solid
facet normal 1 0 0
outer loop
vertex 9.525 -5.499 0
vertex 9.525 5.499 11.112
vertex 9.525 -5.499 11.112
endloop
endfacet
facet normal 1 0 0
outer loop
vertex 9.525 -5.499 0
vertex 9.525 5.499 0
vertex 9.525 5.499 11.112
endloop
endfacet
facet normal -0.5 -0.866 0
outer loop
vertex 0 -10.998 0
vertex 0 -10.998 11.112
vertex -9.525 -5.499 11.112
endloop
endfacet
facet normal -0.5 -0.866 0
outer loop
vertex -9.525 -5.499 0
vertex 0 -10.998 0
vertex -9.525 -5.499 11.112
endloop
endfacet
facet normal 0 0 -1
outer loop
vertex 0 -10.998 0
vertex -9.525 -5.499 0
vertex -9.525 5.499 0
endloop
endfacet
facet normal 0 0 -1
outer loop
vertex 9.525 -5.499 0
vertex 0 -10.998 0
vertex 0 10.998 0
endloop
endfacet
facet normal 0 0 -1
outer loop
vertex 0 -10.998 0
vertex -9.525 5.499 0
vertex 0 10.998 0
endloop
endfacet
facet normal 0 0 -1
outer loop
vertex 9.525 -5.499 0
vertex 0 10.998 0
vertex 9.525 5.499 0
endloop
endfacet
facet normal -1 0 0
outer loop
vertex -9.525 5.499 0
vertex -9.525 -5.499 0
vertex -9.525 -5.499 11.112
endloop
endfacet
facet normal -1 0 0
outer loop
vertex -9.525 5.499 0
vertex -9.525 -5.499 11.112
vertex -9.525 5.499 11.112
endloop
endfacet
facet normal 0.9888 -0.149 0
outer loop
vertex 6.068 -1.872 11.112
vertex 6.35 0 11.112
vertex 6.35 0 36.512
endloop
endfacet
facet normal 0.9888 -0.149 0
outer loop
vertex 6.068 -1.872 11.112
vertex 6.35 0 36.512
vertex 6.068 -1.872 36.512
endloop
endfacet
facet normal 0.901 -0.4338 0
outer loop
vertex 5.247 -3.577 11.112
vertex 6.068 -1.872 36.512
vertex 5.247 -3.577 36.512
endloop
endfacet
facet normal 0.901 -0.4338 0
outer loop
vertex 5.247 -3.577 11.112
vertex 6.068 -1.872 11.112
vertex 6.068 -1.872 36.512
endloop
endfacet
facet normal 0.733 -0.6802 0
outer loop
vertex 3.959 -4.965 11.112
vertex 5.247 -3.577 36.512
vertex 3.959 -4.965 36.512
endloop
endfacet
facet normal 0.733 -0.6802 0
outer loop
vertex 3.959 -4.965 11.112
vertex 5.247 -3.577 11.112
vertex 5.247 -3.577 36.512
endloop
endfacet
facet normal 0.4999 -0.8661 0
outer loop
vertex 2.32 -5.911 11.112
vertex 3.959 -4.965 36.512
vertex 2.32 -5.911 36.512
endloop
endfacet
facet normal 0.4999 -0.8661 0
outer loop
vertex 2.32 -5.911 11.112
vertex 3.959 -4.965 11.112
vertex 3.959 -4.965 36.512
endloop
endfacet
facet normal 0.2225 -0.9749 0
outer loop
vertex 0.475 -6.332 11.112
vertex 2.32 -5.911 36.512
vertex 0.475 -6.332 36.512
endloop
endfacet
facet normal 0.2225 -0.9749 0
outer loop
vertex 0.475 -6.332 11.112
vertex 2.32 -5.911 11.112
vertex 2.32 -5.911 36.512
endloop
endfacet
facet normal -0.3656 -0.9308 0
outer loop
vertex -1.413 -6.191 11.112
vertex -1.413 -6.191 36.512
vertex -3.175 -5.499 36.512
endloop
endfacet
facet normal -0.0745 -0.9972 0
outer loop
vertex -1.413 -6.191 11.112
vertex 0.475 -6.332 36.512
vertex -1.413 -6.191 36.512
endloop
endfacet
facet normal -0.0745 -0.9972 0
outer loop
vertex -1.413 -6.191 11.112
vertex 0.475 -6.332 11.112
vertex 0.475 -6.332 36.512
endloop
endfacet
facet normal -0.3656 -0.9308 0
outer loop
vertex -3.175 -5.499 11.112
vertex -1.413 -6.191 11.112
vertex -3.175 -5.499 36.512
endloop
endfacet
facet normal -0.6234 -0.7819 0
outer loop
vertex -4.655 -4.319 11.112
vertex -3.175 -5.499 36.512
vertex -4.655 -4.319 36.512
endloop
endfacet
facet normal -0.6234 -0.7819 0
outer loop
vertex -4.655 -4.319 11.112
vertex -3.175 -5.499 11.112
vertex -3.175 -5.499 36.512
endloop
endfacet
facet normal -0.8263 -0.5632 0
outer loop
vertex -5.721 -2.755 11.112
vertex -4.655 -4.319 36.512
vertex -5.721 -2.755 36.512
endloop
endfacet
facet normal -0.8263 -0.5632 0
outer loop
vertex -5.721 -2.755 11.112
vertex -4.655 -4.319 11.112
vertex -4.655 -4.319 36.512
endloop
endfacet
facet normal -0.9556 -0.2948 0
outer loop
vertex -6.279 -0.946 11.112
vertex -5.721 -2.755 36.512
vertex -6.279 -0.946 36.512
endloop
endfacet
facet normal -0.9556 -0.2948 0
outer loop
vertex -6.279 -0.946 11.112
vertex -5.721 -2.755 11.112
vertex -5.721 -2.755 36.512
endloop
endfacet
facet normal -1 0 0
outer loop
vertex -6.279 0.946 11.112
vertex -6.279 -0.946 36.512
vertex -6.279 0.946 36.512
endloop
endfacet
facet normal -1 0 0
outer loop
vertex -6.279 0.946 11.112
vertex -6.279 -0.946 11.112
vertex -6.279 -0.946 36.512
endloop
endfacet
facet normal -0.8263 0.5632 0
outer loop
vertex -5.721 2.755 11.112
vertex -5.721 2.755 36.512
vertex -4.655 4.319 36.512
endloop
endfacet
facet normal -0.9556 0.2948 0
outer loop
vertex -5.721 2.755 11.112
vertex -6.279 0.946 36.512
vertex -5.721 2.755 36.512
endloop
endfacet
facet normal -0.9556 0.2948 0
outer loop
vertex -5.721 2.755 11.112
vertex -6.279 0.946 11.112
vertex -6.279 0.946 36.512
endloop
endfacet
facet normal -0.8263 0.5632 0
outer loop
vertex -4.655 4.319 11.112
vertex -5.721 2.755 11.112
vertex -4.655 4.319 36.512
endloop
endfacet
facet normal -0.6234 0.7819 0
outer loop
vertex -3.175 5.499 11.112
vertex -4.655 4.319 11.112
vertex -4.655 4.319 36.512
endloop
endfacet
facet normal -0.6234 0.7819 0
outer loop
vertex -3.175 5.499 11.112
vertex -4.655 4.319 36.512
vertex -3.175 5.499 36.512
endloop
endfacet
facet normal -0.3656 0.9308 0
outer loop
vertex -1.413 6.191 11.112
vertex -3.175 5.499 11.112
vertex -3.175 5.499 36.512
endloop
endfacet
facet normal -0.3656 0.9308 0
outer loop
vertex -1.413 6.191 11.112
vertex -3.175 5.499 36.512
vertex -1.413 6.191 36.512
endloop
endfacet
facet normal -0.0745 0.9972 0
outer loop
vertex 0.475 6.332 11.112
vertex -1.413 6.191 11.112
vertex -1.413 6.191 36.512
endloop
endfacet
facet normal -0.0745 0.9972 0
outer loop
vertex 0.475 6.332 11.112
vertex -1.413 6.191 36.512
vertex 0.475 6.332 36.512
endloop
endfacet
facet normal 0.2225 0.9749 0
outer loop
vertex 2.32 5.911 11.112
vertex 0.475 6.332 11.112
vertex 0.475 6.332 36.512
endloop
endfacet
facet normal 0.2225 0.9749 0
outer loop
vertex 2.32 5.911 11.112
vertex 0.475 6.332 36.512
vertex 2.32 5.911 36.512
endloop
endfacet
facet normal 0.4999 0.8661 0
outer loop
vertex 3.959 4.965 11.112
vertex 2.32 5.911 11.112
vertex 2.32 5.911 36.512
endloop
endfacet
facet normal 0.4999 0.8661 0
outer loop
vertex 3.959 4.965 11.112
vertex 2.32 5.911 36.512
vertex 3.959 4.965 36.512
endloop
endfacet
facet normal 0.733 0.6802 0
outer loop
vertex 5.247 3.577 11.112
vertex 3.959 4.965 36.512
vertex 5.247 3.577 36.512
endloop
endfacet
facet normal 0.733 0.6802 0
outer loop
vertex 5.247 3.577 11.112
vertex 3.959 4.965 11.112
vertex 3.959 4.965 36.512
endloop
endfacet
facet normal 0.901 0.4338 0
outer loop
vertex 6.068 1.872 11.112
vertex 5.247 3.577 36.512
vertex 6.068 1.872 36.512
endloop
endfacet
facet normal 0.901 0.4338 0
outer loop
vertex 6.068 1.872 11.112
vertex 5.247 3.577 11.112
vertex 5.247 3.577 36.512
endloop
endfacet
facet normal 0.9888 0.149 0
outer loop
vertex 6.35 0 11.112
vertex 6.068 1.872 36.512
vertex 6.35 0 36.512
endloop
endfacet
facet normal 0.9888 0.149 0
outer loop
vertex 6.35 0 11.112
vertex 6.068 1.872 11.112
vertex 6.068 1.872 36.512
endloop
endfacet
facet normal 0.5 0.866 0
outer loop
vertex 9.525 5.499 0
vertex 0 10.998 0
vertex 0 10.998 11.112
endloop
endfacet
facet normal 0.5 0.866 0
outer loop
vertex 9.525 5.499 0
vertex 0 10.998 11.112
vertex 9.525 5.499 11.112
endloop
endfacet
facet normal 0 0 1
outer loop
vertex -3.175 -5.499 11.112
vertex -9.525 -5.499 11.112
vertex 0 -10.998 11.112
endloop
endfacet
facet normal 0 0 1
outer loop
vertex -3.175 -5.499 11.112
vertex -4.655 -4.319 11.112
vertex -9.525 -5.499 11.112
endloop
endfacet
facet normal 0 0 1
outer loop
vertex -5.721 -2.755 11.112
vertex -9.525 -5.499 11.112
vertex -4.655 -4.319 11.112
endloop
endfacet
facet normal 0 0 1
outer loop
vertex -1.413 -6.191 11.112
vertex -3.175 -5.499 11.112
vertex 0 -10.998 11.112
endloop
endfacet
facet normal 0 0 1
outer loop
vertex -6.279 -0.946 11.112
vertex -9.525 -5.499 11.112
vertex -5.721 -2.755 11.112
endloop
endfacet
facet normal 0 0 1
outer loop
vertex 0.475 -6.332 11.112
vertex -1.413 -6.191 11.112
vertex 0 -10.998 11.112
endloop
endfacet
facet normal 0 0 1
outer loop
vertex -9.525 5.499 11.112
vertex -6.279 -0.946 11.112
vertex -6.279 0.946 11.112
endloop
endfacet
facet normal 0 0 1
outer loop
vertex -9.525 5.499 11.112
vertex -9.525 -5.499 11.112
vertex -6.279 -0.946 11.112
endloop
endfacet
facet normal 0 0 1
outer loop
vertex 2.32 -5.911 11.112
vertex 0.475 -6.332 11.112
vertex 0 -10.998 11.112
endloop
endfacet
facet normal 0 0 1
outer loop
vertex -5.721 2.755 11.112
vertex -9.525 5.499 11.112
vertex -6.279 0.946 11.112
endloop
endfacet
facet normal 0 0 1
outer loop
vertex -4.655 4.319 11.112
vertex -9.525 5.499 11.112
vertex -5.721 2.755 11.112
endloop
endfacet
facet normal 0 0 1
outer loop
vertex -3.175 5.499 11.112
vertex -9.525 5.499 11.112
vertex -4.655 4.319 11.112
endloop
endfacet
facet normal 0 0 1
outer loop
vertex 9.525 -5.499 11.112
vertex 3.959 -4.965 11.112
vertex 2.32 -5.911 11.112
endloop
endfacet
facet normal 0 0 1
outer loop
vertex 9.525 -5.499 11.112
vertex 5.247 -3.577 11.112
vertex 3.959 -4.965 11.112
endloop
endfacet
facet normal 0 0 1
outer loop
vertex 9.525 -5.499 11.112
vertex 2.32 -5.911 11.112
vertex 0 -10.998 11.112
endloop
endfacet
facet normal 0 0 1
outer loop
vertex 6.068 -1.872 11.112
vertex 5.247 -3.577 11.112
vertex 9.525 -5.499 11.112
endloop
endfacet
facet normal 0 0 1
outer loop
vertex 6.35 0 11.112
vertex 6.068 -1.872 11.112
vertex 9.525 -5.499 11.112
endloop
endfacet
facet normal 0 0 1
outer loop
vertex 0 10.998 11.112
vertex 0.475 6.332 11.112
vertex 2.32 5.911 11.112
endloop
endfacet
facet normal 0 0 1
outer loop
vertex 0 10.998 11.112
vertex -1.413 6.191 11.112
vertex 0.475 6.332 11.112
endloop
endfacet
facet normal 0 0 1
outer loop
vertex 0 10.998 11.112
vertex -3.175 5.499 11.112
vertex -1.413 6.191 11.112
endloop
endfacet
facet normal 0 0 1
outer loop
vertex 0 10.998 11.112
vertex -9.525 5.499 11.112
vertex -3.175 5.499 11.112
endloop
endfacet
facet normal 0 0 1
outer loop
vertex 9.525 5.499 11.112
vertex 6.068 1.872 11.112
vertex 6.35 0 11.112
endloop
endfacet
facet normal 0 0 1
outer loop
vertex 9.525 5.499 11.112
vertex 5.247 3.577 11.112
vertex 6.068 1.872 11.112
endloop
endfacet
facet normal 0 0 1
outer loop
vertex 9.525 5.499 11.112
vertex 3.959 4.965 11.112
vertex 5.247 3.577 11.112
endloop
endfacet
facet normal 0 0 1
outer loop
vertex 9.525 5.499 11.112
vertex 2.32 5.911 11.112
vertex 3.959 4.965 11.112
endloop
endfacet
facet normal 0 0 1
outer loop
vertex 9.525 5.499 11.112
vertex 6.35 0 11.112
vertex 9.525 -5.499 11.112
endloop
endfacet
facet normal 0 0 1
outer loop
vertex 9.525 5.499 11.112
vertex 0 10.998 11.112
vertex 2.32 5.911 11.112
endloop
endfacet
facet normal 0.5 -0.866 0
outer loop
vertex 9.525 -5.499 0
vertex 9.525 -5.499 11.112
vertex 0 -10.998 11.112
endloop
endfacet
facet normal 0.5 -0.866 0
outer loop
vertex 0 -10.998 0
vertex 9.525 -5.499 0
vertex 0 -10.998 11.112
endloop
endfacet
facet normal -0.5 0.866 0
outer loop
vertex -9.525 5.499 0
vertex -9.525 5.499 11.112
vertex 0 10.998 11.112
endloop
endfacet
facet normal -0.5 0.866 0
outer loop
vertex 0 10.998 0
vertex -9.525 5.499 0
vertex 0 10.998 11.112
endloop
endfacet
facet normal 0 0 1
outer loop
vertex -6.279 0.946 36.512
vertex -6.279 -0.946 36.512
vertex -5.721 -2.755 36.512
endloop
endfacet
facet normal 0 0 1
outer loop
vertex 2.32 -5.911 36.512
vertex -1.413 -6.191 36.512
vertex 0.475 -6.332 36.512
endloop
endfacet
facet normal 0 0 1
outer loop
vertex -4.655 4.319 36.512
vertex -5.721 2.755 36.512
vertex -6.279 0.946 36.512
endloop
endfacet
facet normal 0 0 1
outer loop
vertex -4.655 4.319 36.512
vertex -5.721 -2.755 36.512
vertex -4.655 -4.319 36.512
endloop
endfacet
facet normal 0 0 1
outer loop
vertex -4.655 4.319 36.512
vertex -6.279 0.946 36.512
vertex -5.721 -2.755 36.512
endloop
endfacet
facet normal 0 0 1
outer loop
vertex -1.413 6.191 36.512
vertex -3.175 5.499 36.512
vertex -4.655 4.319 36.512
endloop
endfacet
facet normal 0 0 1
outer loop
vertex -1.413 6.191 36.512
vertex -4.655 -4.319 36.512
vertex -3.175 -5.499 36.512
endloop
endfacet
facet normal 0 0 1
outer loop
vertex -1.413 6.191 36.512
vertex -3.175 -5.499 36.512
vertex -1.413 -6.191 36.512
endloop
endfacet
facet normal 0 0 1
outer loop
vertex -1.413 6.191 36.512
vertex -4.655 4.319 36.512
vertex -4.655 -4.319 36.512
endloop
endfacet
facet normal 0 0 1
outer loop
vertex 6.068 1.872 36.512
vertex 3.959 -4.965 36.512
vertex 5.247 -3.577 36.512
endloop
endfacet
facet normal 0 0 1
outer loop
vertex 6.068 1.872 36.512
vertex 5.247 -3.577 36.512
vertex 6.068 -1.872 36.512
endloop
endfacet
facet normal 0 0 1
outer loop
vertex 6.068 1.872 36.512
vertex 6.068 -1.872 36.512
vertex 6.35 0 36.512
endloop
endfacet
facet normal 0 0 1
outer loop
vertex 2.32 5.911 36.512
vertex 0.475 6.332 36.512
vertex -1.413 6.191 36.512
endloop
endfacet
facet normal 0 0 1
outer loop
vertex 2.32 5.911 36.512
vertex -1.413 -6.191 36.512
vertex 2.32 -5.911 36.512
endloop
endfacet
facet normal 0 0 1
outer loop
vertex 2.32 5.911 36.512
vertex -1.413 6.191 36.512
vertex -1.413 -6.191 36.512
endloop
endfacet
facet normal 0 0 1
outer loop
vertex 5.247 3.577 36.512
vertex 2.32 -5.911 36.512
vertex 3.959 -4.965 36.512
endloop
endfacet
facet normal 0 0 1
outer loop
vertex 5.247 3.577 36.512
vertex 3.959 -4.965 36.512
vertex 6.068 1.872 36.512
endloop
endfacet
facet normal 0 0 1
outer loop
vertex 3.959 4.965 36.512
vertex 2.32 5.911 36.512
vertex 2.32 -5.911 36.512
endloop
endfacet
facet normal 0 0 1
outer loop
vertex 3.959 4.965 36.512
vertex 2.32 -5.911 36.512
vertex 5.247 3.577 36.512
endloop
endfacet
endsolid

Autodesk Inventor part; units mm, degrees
ref_plane "YZ Plane" through (0, 0, 0) normal (1, 0, 0) x (0, 1, 0)
ref_plane "XZ Plane" through (0, 0, 0) normal (0, 1, 0) x (-1, 0, 0)
ref_plane "XY Plane" through (0, 0, 0) normal (0, 0, 1) x (1, 0, 0)
sketch "Sketch1" plane through (0, 0, 0) normal (0, 0, 1) x (1, 0, 0)
  line L0 (-9.525, 5.4993) -> (0, 10.9985)
  line L1 (0, 10.9985) -> (9.525, 5.4993)
  line L2 (9.525, 5.4993) -> (9.525, -5.4993)
  line L3 (9.525, -5.4993) -> (0, -10.9985)
  line L4 (0, -10.9985) -> (-9.525, -5.4993)
  line L5 (-9.525, -5.4993) -> (-9.525, 5.4993)
  point P0 (0, 0)
  point P1 (0, 0)
  dimension "d0" = 19.05
extrude "Extrusion1" add sketch "Sketch1" along normal blind 11.1125
sketch "Sketch2" plane through (0, 0, 11.1125) normal (0, 0, 1) x (1, 0, 0)
  circle A0 centre (0, 0) radius 6.35
  point P0 (0, 0)
  dimension "d3" = 12.7
extrude "Extrusion2" add sketch "Sketch2" along normal blind 25.4
properties part number "short half-inch hex bolt" material "Steel"
